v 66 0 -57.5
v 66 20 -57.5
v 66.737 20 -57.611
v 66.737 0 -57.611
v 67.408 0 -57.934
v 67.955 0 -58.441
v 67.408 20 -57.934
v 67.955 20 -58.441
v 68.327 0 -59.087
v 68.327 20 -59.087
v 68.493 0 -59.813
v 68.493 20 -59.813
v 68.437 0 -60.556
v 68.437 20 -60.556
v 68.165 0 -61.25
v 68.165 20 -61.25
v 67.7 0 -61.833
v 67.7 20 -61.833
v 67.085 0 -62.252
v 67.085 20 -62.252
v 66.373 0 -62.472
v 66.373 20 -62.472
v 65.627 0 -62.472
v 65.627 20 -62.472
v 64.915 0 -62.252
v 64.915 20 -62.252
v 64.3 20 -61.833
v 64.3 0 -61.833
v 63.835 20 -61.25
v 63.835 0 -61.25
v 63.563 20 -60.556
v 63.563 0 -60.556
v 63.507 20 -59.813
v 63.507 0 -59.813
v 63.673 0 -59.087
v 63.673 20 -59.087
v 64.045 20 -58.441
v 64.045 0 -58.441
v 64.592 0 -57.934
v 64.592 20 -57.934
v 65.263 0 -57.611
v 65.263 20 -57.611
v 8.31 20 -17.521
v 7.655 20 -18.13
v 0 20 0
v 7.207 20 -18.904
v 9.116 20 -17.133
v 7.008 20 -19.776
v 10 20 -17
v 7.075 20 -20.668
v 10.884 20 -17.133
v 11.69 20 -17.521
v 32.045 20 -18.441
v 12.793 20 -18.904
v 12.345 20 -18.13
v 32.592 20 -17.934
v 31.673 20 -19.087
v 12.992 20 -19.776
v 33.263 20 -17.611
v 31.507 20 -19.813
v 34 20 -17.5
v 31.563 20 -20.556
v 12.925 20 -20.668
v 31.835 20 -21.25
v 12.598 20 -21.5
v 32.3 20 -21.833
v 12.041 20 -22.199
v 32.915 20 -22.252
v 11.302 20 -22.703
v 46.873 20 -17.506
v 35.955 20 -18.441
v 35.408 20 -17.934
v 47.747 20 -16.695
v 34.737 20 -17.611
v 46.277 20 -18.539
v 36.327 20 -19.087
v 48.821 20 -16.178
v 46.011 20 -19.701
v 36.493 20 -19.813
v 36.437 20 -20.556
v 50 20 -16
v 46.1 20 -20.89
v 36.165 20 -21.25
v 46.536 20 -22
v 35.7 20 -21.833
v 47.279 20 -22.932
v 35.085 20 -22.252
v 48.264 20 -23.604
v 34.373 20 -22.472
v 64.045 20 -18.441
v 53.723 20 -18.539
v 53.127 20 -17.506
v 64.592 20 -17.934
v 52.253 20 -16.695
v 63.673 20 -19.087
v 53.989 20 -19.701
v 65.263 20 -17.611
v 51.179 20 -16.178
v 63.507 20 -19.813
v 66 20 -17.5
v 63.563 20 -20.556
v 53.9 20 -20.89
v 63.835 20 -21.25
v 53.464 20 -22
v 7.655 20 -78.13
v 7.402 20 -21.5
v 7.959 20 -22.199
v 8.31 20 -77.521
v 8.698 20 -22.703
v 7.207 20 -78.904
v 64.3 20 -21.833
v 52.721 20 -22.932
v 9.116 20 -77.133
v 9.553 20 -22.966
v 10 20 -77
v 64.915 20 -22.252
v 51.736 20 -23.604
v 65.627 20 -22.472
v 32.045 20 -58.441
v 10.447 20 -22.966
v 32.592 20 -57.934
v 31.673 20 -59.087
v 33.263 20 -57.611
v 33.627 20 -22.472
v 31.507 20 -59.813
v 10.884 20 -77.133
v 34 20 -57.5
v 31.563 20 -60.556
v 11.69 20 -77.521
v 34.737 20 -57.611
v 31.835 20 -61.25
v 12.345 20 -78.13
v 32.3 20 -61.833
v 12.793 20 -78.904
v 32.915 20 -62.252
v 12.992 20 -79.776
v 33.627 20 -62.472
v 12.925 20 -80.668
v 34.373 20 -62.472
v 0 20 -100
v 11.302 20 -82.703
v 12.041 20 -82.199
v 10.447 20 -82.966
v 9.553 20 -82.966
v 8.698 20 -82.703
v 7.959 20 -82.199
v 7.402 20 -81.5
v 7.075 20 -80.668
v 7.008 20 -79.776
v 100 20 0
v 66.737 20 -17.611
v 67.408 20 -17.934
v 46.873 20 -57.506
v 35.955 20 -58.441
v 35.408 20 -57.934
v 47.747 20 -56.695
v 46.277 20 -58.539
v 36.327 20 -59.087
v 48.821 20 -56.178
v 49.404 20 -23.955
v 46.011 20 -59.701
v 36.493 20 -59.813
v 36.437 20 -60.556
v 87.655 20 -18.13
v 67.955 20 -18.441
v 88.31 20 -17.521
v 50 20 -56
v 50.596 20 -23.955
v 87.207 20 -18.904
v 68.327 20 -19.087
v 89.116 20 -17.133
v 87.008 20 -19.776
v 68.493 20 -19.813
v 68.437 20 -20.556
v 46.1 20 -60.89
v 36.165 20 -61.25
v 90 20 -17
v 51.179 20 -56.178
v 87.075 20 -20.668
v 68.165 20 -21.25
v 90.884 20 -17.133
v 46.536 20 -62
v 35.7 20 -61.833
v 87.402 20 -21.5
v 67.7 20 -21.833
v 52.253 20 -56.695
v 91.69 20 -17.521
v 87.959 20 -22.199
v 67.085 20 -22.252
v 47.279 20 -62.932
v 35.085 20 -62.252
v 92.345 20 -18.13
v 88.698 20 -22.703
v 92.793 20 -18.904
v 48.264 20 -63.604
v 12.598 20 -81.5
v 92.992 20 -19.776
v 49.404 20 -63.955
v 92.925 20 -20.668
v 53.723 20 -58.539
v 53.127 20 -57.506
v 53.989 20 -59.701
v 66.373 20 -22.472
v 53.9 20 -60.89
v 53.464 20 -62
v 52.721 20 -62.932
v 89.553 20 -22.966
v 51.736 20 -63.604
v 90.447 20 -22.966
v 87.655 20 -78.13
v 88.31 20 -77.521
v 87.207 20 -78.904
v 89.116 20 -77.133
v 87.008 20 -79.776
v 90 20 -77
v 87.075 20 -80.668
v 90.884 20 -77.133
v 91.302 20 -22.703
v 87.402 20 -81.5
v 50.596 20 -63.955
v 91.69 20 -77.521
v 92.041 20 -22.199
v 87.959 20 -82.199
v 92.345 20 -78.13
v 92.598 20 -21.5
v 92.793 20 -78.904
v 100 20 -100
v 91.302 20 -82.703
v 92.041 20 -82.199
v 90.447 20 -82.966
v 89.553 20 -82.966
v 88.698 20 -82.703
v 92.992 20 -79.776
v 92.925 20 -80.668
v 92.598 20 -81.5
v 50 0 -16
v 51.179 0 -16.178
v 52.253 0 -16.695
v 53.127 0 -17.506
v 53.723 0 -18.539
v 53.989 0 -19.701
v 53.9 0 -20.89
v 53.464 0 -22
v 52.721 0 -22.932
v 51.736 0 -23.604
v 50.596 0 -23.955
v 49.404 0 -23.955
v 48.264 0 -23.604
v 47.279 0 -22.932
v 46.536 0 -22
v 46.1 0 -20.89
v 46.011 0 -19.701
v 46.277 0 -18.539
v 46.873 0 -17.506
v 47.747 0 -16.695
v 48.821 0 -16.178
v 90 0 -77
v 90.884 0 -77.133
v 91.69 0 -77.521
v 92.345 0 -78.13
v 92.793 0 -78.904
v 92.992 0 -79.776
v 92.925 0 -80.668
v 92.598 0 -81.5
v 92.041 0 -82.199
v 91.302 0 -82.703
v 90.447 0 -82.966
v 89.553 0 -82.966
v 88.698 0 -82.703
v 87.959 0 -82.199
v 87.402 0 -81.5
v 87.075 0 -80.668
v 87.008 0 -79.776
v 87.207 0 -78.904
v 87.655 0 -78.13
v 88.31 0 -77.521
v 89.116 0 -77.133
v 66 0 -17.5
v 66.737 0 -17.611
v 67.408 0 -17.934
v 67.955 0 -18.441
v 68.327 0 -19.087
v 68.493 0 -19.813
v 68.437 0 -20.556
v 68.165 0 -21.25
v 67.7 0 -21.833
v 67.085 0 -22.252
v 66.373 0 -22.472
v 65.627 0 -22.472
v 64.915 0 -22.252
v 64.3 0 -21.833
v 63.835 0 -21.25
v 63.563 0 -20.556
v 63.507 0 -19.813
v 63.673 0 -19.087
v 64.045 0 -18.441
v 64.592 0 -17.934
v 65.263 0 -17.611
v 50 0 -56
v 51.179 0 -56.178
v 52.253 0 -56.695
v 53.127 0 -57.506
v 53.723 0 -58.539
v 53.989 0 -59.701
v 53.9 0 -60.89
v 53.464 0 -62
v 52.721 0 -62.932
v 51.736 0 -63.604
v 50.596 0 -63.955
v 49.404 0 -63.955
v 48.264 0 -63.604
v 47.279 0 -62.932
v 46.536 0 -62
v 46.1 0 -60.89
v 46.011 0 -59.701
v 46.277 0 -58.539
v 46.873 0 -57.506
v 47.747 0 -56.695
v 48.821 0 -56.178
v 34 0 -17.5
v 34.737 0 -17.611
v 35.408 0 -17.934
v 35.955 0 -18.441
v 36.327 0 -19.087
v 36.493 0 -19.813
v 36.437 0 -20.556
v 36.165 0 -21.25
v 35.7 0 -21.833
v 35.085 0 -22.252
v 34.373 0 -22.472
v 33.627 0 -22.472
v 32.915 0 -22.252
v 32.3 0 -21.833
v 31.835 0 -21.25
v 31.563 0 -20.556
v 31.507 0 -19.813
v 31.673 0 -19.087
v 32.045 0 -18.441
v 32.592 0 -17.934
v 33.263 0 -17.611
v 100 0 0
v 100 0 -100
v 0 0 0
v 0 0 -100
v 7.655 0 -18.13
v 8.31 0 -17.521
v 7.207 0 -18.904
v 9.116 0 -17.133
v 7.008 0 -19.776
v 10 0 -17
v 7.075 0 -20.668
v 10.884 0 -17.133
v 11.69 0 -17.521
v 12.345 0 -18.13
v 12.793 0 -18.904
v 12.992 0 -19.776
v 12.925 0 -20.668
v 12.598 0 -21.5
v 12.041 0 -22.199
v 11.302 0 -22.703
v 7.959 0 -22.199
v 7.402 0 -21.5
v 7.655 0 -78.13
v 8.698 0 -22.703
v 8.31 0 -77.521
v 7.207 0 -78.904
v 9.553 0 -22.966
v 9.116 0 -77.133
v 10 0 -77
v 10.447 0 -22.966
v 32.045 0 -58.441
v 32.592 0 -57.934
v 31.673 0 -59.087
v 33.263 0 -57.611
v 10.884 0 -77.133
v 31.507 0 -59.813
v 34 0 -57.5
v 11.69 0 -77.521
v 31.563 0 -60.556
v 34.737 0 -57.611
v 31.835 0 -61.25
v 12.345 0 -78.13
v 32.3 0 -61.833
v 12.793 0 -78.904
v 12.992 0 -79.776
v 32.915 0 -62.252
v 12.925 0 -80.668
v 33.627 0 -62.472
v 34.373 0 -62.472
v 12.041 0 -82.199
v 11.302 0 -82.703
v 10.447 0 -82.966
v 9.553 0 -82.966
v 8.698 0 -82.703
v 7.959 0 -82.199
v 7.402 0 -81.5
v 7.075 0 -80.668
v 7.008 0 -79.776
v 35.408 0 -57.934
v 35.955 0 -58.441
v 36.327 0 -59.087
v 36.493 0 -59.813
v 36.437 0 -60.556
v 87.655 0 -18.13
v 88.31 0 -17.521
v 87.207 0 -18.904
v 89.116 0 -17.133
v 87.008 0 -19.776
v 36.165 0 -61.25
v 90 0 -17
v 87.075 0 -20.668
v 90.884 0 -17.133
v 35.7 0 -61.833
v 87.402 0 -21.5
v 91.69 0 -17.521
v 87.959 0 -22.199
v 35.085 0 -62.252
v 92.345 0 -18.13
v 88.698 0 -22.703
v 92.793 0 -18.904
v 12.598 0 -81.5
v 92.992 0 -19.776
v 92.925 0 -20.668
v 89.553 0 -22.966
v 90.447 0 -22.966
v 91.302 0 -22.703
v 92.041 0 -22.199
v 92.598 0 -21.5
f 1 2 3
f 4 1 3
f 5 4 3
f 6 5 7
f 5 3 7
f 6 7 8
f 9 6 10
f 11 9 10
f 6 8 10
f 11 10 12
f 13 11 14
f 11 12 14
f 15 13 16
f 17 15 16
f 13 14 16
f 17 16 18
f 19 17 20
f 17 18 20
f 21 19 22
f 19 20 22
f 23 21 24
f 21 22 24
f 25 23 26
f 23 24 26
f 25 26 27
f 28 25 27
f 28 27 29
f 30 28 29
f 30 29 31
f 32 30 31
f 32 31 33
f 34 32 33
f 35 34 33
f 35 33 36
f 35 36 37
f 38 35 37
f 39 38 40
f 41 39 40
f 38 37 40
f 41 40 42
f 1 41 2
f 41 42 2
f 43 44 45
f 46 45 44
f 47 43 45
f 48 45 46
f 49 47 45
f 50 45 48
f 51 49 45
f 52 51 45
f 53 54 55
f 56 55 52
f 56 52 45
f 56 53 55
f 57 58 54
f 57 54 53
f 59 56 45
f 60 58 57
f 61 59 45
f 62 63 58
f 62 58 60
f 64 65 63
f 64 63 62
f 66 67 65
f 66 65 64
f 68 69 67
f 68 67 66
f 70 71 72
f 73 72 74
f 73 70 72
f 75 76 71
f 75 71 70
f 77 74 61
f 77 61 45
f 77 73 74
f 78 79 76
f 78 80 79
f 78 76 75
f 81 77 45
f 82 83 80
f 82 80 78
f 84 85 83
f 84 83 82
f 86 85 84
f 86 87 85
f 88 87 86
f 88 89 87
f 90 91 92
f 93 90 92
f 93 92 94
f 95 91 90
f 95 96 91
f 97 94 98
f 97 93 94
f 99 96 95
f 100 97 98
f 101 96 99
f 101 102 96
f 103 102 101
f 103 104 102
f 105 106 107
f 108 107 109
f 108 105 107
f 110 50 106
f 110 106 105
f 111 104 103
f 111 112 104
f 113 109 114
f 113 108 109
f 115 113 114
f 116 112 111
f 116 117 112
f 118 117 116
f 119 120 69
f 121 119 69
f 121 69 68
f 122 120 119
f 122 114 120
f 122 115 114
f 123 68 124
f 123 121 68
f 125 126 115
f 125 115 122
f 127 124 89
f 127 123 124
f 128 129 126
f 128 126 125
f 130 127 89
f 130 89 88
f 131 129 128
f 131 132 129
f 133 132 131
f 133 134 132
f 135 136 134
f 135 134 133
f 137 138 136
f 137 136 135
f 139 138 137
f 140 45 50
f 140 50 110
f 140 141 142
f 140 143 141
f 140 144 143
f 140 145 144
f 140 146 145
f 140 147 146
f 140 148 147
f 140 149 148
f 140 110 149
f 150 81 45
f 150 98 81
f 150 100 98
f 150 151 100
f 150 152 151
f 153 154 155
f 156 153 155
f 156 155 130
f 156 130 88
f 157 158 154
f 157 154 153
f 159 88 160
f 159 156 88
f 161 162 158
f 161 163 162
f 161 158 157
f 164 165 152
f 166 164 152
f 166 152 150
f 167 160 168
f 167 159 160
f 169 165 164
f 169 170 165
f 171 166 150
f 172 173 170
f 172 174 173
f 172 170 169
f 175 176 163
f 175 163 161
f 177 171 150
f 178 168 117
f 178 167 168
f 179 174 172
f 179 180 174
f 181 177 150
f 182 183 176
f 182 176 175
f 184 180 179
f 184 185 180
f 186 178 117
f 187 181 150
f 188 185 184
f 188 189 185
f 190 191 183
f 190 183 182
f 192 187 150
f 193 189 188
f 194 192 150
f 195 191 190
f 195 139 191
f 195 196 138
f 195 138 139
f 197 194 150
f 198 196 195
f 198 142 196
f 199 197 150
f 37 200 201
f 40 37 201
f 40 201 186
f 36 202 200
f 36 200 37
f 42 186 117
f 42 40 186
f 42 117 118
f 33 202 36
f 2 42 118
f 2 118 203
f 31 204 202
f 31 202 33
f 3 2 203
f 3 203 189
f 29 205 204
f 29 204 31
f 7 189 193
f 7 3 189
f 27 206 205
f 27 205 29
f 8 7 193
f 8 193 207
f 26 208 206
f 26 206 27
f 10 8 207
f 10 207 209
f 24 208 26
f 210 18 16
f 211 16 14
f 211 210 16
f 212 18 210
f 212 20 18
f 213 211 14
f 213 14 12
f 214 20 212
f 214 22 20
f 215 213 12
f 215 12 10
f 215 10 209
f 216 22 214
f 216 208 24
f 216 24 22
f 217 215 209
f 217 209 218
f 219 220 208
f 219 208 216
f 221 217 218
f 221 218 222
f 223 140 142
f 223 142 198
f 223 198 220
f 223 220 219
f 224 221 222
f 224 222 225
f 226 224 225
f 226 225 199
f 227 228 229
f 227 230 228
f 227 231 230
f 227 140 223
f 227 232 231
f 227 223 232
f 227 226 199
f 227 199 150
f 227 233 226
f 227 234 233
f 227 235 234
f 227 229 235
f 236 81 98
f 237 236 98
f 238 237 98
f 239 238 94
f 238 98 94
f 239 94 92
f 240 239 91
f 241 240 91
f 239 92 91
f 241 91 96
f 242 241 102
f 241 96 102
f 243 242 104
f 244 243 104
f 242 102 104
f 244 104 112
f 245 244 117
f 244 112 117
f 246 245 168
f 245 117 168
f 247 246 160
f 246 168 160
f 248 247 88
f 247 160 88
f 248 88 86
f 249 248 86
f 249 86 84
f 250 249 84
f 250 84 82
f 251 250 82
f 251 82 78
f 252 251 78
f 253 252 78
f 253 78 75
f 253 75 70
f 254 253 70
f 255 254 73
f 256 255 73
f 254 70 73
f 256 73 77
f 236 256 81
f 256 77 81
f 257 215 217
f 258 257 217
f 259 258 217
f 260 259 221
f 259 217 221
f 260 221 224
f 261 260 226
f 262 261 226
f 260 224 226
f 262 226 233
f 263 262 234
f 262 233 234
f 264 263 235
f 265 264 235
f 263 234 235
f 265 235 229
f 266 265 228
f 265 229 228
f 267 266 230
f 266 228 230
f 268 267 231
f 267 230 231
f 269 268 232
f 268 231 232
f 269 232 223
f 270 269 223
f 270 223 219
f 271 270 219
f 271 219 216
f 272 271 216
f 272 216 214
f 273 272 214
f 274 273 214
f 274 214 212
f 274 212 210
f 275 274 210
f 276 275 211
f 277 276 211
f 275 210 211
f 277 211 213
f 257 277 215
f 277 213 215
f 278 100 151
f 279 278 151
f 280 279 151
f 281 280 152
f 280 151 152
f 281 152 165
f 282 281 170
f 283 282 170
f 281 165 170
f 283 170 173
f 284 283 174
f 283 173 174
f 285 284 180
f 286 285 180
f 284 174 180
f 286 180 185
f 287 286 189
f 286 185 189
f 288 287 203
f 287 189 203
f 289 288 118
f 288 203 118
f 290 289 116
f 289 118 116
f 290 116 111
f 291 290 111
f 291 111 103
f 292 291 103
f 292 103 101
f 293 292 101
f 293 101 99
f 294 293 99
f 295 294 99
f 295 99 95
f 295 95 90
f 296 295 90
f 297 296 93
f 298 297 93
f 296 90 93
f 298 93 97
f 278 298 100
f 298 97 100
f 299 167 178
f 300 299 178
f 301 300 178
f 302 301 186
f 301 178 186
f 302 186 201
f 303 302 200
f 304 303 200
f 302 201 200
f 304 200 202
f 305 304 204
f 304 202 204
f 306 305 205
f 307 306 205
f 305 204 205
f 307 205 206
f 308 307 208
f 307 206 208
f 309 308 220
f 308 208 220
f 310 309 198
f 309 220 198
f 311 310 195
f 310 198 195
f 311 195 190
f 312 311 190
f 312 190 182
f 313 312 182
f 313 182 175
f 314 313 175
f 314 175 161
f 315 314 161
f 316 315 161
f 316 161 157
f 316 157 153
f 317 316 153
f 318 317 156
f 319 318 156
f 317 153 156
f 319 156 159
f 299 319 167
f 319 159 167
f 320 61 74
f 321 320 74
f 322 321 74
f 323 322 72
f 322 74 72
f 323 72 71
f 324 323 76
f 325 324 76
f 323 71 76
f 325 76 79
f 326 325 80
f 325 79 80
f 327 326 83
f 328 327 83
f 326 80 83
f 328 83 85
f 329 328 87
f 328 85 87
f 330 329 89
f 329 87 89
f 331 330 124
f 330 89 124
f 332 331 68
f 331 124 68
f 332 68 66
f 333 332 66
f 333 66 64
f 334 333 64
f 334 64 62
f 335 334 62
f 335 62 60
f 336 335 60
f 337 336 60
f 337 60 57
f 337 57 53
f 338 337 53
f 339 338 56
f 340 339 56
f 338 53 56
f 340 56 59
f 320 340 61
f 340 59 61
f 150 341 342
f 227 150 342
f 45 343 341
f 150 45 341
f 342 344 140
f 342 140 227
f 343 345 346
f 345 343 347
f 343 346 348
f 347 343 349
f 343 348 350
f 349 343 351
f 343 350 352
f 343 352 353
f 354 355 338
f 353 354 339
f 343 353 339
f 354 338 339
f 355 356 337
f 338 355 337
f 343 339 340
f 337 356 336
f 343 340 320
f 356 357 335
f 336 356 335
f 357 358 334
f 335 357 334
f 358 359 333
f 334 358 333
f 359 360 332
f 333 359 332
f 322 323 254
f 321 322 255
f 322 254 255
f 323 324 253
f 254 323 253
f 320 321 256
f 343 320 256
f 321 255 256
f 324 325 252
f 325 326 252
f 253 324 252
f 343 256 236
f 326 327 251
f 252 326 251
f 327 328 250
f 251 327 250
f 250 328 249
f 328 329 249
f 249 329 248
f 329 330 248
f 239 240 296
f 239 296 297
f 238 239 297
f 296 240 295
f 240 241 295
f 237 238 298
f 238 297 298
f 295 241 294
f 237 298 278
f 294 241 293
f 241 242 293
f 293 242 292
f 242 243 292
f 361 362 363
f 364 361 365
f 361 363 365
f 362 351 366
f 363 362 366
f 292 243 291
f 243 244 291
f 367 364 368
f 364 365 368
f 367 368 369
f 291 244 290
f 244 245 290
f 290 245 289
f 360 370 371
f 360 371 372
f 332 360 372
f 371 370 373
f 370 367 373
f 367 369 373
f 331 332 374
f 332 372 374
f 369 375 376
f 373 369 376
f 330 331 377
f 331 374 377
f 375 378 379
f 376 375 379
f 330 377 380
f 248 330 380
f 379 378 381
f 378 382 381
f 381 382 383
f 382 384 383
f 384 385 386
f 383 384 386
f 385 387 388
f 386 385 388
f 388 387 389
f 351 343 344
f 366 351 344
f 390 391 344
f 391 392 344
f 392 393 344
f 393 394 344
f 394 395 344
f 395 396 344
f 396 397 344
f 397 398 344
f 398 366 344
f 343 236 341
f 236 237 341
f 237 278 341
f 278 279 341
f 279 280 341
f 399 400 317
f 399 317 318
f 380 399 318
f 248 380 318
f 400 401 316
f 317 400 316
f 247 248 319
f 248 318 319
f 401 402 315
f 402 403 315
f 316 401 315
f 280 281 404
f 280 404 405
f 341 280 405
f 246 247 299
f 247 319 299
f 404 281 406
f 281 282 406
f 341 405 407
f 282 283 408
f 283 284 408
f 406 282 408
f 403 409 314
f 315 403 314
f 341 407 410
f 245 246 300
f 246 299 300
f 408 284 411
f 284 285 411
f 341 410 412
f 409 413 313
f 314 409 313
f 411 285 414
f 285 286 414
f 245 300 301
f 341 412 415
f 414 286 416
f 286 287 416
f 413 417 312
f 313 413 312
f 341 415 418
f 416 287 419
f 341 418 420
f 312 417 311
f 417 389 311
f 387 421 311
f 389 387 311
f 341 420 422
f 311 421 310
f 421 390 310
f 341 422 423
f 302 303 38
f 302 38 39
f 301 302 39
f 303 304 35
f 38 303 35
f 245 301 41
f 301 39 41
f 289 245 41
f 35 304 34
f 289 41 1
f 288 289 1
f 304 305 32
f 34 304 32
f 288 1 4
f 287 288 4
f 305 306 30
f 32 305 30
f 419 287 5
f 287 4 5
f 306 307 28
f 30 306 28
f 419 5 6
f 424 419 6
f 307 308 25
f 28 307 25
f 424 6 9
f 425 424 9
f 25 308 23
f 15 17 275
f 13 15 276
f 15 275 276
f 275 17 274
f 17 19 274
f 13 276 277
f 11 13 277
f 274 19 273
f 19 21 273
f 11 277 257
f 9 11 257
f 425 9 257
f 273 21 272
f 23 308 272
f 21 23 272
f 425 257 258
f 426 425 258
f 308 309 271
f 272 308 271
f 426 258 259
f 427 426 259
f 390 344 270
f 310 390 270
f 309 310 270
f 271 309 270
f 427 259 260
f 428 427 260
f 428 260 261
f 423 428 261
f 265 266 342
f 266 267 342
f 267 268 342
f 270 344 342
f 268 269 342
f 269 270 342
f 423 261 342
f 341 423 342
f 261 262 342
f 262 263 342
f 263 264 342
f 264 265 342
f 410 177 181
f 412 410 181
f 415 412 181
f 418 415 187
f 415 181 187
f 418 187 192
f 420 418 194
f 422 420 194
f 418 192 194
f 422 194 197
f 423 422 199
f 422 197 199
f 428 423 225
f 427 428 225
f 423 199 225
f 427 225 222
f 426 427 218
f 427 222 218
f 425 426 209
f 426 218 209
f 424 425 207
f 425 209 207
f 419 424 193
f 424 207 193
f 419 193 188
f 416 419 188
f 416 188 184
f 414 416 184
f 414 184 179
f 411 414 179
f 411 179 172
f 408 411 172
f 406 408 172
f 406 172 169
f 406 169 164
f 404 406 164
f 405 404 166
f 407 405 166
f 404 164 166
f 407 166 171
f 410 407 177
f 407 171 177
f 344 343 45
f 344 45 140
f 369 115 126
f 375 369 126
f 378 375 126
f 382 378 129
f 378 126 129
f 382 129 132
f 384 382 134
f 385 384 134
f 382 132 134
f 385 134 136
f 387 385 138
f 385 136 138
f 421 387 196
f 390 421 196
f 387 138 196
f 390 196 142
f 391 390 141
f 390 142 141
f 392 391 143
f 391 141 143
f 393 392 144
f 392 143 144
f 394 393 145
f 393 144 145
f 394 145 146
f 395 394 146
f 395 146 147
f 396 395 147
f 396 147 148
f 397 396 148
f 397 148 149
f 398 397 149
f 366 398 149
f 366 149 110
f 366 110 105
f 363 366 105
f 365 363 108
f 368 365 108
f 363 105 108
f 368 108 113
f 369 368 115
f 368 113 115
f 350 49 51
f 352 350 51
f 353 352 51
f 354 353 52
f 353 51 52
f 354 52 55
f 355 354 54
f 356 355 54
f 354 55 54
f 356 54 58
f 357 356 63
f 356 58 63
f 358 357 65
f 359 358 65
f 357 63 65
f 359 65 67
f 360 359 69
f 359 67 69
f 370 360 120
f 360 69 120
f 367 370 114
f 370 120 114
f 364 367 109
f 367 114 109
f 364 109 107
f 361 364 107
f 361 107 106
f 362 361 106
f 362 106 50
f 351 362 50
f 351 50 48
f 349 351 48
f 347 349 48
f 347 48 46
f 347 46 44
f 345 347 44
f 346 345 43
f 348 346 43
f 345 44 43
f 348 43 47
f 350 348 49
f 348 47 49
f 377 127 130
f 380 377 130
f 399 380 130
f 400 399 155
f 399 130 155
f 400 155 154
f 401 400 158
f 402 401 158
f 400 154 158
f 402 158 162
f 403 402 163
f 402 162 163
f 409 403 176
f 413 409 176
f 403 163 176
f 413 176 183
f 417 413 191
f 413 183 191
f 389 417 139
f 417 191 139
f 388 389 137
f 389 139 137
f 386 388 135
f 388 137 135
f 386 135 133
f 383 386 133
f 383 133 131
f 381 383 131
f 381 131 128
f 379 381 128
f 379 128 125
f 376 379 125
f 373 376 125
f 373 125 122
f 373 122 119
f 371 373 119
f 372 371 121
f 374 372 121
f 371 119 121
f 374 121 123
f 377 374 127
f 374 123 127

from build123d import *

# Parameters (mm, degrees)
SKETCH_1_W          = 100
SKETCH_1_H          = 100
EXTRUDE_1_DEPTH     = 20
SKETCH_2_R          = 3
SKETCH_2_R_2        = 2.5
SKETCH_2_R_3        = 4
CUT_EXTRUDE_1_DEPTH = 20


with BuildPart() as part:
    # Эскиз1 → Бобышка-Вытянуть1 (new body)
    with BuildSketch(Plane(origin=(0, 0, 0), x_dir=(1, 0, 0), z_dir=(0, 1, 0))):
        with Locations((50, 50)):
            Rectangle(SKETCH_1_W, SKETCH_1_H)
    extrude(amount=EXTRUDE_1_DEPTH)

    # Эскиз2 → Вырез-Вытянуть1 (cut)
    with BuildSketch(Plane(origin=(0, 20, 0), x_dir=(1, 0, 0), z_dir=(0, 1, 0))):
        with Locations(Location((10, 80, 0), (0, 0, 270))):
            Circle(SKETCH_2_R)
        with Locations(Location((90, 80, 0), (0, 0, 270))):
            Circle(SKETCH_2_R)
        with Locations(Location((34, 60, 0), (0, 0, 270))):
            Circle(SKETCH_2_R_2)
        with Locations(Location((50, 20, 0), (0, 0, 270))):
            Circle(SKETCH_2_R_3)
        with Locations(Location((66, 60, 0), (0, 0, 270))):
            Circle(SKETCH_2_R_2)
        with Locations(Location((10, 20, 0), (0, 0, 270))):
            Circle(SKETCH_2_R)
        with Locations(Location((50, 60, 0), (0, 0, 270))):
            Circle(SKETCH_2_R_3)
        with Locations(Location((90, 20, 0), (0, 0, 270))):
            Circle(SKETCH_2_R)
        with Locations(Location((34, 20, 0), (0, 0, 270))):
            Circle(SKETCH_2_R_2)
        with Locations(Location((66, 20, 0), (0, 0, 270))):
            Circle(SKETCH_2_R_2)
    extrude(amount=-CUT_EXTRUDE_1_DEPTH, mode=Mode.SUBTRACT)


solid = part.part
